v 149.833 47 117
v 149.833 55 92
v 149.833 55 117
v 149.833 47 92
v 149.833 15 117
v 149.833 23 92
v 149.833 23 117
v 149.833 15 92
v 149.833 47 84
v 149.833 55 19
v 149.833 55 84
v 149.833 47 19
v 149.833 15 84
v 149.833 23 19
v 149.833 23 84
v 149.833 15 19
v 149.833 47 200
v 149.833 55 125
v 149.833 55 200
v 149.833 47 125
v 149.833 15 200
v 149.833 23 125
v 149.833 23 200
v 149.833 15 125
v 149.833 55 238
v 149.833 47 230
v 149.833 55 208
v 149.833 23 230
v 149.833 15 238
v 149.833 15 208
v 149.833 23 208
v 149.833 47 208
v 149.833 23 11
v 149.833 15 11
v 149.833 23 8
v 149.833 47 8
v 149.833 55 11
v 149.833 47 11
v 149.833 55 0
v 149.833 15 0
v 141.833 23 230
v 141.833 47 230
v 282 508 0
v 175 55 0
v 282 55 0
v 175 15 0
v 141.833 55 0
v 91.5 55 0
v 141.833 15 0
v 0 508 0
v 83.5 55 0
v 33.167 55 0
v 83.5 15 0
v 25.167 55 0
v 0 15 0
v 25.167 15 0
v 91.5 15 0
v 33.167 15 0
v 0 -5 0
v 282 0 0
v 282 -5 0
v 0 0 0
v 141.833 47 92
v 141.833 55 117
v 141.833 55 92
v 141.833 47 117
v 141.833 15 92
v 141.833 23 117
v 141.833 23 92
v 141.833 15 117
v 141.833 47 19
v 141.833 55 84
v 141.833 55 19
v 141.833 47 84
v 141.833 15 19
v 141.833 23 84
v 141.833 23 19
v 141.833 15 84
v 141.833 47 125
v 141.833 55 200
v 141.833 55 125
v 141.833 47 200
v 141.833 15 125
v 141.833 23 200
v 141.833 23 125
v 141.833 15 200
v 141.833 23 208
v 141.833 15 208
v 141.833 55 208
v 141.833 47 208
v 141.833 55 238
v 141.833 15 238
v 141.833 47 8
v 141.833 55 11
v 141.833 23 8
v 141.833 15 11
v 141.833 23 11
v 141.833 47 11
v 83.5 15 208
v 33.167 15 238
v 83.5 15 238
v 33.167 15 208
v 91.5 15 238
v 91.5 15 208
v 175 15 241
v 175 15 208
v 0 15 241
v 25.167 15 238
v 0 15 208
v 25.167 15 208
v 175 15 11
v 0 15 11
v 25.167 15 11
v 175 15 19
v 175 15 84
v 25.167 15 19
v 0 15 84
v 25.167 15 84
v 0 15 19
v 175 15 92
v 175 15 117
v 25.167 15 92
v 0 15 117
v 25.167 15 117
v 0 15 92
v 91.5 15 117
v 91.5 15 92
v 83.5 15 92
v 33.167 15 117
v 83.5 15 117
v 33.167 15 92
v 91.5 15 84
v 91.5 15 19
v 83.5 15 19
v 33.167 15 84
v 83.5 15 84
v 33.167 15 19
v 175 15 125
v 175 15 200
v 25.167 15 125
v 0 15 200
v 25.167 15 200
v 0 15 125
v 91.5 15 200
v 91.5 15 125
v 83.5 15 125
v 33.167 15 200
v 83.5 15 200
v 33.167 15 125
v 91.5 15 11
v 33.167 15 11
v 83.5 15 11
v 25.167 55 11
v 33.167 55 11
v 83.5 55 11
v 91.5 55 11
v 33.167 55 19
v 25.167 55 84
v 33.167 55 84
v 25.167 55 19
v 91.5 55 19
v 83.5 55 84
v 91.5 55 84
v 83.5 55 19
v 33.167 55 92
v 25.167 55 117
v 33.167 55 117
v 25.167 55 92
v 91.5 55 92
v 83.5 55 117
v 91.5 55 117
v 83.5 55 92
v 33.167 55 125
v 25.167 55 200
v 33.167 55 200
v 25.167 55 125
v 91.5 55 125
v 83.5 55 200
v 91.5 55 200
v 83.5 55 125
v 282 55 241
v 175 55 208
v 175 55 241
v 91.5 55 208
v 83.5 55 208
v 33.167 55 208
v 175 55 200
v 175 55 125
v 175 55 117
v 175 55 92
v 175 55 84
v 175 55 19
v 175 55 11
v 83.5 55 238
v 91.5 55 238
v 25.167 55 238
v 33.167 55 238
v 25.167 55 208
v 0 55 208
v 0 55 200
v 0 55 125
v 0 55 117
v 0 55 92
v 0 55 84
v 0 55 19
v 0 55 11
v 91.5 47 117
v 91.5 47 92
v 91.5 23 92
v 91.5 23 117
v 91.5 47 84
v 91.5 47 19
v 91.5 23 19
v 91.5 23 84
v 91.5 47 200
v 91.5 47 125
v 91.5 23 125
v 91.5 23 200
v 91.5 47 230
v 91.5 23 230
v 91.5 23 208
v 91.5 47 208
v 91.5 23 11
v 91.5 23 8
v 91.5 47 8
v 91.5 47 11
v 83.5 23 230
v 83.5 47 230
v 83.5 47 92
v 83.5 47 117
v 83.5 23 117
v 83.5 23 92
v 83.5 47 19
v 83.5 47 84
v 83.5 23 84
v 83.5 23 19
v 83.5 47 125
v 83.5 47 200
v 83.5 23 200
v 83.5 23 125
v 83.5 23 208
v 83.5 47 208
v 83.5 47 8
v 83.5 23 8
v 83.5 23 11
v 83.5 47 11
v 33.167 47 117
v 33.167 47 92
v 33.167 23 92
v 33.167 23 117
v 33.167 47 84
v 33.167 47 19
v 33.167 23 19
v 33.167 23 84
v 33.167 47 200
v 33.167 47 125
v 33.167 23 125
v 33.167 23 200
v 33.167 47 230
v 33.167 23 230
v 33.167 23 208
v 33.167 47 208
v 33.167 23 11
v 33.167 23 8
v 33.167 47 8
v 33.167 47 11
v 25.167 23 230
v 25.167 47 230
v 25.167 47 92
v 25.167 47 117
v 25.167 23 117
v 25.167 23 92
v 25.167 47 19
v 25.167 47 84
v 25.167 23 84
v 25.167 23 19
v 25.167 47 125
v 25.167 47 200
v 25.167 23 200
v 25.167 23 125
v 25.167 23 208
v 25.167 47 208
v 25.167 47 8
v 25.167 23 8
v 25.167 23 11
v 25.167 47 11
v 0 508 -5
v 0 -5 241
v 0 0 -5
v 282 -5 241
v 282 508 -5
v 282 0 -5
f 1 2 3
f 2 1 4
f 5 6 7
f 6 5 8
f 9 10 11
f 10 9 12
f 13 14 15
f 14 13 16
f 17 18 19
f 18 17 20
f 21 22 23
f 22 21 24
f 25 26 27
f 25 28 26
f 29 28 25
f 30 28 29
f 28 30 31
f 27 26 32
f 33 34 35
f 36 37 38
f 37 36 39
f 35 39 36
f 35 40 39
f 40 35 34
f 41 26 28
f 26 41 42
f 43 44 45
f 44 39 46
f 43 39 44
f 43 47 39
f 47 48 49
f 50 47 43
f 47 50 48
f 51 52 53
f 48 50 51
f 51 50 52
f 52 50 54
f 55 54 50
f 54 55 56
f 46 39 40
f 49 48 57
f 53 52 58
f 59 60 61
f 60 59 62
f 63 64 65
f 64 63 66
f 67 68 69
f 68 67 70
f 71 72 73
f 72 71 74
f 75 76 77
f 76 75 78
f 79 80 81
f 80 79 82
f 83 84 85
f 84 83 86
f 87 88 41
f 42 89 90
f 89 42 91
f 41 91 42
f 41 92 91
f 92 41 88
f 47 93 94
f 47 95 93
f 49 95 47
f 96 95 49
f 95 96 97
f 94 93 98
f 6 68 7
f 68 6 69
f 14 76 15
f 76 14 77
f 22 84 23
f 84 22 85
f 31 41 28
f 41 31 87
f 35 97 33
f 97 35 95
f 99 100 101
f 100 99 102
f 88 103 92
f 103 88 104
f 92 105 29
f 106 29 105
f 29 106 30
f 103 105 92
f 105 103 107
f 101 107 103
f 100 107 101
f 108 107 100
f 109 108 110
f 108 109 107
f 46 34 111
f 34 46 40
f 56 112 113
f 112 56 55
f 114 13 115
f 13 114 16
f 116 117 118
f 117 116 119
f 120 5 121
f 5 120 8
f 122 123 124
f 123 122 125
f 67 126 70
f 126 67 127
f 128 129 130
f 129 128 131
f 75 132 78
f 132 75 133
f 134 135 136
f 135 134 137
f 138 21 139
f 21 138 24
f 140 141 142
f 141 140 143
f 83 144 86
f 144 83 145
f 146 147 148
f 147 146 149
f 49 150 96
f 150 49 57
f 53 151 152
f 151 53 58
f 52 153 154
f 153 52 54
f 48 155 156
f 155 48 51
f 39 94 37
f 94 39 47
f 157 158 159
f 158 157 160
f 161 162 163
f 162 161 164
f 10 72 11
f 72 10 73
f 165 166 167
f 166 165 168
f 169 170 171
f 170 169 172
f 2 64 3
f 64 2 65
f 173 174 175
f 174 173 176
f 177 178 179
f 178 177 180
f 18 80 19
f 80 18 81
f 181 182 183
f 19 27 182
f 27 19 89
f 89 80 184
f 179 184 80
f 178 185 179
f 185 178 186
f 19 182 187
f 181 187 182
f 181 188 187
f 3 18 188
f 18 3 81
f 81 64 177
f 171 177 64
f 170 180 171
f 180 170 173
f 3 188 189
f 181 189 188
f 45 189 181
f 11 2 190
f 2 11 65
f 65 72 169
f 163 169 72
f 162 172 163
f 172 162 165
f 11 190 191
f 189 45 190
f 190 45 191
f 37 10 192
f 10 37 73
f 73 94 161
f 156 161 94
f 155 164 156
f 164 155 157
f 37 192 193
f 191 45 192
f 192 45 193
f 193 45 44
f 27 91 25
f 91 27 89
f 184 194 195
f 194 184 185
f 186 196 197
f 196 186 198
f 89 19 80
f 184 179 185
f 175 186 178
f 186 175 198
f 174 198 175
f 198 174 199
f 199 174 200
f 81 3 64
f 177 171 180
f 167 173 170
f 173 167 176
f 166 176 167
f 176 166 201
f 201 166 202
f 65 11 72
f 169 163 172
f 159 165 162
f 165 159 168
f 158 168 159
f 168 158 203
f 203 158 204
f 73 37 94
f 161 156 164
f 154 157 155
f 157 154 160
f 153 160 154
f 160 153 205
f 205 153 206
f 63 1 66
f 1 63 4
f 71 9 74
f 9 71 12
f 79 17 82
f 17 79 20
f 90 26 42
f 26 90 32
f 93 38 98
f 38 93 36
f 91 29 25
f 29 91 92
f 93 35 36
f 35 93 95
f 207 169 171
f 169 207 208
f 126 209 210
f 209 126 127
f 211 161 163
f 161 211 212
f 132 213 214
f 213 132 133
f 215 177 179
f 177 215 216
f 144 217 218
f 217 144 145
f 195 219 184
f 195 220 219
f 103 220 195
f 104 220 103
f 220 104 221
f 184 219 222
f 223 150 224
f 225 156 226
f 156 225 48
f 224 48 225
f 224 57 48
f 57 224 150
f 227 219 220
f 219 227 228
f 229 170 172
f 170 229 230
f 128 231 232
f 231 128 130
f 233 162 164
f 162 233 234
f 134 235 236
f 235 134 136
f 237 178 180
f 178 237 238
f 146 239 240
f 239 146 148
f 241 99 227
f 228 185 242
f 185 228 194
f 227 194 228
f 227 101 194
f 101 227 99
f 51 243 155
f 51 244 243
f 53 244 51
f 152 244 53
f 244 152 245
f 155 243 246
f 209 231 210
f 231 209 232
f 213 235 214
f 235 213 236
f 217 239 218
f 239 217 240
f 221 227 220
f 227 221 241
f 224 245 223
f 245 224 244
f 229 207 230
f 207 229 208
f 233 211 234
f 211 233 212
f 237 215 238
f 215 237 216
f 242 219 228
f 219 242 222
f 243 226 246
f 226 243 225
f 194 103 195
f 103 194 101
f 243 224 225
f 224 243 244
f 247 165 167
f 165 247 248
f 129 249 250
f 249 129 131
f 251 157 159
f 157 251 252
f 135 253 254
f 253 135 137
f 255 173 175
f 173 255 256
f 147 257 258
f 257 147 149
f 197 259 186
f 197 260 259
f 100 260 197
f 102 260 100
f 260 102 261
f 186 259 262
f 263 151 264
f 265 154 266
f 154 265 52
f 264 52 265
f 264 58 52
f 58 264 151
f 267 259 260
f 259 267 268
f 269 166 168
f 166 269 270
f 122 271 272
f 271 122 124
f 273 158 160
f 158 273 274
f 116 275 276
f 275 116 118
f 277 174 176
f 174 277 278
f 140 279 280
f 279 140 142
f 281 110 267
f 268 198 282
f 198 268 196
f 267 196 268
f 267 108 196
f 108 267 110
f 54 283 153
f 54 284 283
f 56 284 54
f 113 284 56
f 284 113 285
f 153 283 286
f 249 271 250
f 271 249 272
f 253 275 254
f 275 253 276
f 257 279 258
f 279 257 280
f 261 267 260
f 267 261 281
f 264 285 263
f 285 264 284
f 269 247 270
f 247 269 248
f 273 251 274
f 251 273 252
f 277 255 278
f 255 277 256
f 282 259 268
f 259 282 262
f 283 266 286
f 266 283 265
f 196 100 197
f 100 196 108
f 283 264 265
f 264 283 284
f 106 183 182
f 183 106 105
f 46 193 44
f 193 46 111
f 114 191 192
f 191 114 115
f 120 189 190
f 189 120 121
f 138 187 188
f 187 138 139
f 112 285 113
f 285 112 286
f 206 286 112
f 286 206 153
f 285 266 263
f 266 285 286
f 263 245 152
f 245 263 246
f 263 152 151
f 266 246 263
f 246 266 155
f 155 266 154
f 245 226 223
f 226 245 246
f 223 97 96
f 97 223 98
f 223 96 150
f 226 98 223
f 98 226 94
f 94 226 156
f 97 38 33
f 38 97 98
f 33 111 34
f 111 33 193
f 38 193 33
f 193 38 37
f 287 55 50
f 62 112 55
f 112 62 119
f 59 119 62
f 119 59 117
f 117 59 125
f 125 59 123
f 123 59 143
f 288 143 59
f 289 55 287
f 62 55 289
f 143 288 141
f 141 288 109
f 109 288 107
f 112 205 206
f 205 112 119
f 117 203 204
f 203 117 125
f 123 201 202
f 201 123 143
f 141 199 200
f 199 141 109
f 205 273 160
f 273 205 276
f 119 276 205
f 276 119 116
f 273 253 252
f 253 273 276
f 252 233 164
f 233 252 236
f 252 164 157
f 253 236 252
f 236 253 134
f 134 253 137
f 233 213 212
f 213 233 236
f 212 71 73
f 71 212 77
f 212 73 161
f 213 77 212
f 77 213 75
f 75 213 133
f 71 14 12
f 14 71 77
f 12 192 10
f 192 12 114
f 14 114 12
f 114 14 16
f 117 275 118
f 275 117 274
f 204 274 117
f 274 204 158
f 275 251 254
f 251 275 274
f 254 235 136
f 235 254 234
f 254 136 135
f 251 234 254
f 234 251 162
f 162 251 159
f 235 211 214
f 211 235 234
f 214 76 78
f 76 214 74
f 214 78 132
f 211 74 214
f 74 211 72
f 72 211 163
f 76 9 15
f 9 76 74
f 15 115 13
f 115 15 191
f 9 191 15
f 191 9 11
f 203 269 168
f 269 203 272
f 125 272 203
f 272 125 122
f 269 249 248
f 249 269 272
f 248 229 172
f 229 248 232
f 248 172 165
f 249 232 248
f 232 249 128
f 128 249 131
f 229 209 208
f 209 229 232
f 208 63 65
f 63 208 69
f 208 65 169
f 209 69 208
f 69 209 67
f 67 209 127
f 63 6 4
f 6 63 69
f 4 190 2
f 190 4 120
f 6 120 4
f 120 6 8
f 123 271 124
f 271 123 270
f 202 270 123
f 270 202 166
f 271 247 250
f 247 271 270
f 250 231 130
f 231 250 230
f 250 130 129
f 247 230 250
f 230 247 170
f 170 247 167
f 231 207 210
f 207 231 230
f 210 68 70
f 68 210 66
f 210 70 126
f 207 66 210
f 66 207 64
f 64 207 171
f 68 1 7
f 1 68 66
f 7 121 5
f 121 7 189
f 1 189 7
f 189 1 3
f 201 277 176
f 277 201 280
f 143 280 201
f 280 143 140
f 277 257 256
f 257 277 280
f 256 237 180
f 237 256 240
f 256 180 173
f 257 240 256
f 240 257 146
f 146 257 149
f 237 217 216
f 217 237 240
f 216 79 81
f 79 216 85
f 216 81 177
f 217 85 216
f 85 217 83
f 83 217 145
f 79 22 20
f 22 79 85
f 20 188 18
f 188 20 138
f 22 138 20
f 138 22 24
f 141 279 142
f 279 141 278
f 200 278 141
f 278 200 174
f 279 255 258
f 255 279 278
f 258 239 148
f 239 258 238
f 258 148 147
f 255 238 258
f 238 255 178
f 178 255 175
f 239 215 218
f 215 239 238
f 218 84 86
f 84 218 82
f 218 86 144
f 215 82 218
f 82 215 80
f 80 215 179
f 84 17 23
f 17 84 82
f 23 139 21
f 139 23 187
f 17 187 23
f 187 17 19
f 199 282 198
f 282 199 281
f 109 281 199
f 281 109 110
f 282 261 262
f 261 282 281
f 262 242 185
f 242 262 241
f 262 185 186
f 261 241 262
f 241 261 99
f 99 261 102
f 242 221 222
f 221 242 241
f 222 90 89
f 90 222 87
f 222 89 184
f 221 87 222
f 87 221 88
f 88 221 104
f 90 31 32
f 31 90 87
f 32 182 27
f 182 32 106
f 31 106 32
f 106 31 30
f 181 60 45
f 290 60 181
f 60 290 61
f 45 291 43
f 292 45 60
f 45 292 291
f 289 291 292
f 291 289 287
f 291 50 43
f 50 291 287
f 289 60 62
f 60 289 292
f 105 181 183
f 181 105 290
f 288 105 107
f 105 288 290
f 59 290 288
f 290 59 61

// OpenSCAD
// all in cm
spacer = 5;

toilet_wall_width = 107;
green_box_width = 175;
green_box_thickness = spacer * 4;
max_depth = 40;

room_width = toilet_wall_width + green_box_width;
room_length = 508;
room_height = 241;

metal_bars_width = 8;
wood_thickness = 4;
metal_thickness = 4;

stone_floor();
toilet_wall();
green_box();
furniture();

// x, y, z
module stone_floor() {
  translate([0, 0, -spacer])
    color("GhostWhite") cube([room_width, room_length, spacer]);
}

module green_box() {
  translate([0, -spacer, 0])
    color("Silver") cube([green_box_width, green_box_thickness, room_height]);
}

module toilet_wall() {
  translate([green_box_width, -spacer, 0])
    color("Silver") cube([toilet_wall_width, max_depth + green_box_thickness, room_height]);
}

module furniture() {
  floor_furniture_spacing = 11;
  furniture_width = green_box_width;
  furniture_center = furniture_width / 2;
  furniture_quarter_right = furniture_center / 3 * 1;
  furniture_quarter_left = furniture_center + (furniture_center / 3 * 2);
  furniture_height = room_height - floor_furniture_spacing;

  pilar1 = furniture_quarter_left - (metal_bars_width / 2);
  pilar2 = furniture_center - (metal_bars_width / 2);
  pilar3 = furniture_quarter_right - (metal_bars_width / 2);

  vertical_frame(pilar1, furniture_height);
  vertical_frame(pilar2, furniture_height);
  vertical_frame(pilar3, furniture_height);

  furniture_start = floor_furniture_spacing;
  row1 = 65 + metal_thickness + wood_thickness;
  row2 = 25 + metal_thickness + wood_thickness;
  row3 = 75 + metal_thickness + wood_thickness;

  shelf(
    furniture_width,
    furniture_start,
    pilar1, pilar2, pilar3);

  shelf(
    furniture_width,
    furniture_start + row1,
    pilar1, pilar2, pilar3);

  shelf(
    furniture_width,
    furniture_start + row1 + row2,
    pilar1, pilar2, pilar3);

  shelf(
    furniture_width,
    furniture_start + row1 + row2 + row3,
    pilar1, pilar2, pilar3);
}

module vertical_frame(start, height) {
    // max_depth
  translate([start, green_box_thickness - spacer, 0])
    color("Black") cube([metal_bars_width, metal_bars_width, height]);

  translate([start, green_box_thickness - spacer + max_depth - metal_bars_width, 0])
    color("Black") cube([metal_bars_width, metal_bars_width, height]);

  translate([start, green_box_thickness - spacer, height])
    color("Black") cube([metal_bars_width, max_depth, metal_bars_width]);

  translate([start, green_box_thickness - spacer, 0])
    color("Black") cube([metal_bars_width, max_depth, metal_bars_width]);
}

module shelf(width, height, pilar1, pilar2, pilar3) {
  height = height + metal_thickness;

  translate([0, green_box_thickness - spacer, height - metal_thickness])
    color("Black") cube([width, max_depth, metal_thickness]);

  translate([0, green_box_thickness - spacer, height])
    color("OrangeRed") cube([pilar3, max_depth, wood_thickness]);

  translate([pilar3, green_box_thickness - spacer + metal_bars_width, height])
    color("OrangeRed") cube([metal_bars_width, max_depth - (metal_bars_width * 2), wood_thickness]);

  translate([pilar3 + metal_bars_width, green_box_thickness - spacer, height])
    color("OrangeRed") cube([pilar2 - pilar3 - metal_bars_width, max_depth, wood_thickness]);

  translate([pilar2, green_box_thickness - spacer + metal_bars_width, height])
    color("OrangeRed") cube([metal_bars_width, max_depth - (metal_bars_width * 2), wood_thickness]);

  translate([pilar2 + metal_bars_width, green_box_thickness - spacer, height])
    color("OrangeRed") cube([pilar1 - pilar2 - metal_bars_width, max_depth, wood_thickness]);

  translate([pilar1, green_box_thickness - spacer + metal_bars_width, height])
    color("OrangeRed") cube([metal_bars_width, max_depth - (metal_bars_width * 2), wood_thickness]);

  translate([pilar1 + metal_bars_width, green_box_thickness - spacer, height])
    color("OrangeRed") cube([width - pilar1 - metal_bars_width, max_depth, wood_thickness]);
}
